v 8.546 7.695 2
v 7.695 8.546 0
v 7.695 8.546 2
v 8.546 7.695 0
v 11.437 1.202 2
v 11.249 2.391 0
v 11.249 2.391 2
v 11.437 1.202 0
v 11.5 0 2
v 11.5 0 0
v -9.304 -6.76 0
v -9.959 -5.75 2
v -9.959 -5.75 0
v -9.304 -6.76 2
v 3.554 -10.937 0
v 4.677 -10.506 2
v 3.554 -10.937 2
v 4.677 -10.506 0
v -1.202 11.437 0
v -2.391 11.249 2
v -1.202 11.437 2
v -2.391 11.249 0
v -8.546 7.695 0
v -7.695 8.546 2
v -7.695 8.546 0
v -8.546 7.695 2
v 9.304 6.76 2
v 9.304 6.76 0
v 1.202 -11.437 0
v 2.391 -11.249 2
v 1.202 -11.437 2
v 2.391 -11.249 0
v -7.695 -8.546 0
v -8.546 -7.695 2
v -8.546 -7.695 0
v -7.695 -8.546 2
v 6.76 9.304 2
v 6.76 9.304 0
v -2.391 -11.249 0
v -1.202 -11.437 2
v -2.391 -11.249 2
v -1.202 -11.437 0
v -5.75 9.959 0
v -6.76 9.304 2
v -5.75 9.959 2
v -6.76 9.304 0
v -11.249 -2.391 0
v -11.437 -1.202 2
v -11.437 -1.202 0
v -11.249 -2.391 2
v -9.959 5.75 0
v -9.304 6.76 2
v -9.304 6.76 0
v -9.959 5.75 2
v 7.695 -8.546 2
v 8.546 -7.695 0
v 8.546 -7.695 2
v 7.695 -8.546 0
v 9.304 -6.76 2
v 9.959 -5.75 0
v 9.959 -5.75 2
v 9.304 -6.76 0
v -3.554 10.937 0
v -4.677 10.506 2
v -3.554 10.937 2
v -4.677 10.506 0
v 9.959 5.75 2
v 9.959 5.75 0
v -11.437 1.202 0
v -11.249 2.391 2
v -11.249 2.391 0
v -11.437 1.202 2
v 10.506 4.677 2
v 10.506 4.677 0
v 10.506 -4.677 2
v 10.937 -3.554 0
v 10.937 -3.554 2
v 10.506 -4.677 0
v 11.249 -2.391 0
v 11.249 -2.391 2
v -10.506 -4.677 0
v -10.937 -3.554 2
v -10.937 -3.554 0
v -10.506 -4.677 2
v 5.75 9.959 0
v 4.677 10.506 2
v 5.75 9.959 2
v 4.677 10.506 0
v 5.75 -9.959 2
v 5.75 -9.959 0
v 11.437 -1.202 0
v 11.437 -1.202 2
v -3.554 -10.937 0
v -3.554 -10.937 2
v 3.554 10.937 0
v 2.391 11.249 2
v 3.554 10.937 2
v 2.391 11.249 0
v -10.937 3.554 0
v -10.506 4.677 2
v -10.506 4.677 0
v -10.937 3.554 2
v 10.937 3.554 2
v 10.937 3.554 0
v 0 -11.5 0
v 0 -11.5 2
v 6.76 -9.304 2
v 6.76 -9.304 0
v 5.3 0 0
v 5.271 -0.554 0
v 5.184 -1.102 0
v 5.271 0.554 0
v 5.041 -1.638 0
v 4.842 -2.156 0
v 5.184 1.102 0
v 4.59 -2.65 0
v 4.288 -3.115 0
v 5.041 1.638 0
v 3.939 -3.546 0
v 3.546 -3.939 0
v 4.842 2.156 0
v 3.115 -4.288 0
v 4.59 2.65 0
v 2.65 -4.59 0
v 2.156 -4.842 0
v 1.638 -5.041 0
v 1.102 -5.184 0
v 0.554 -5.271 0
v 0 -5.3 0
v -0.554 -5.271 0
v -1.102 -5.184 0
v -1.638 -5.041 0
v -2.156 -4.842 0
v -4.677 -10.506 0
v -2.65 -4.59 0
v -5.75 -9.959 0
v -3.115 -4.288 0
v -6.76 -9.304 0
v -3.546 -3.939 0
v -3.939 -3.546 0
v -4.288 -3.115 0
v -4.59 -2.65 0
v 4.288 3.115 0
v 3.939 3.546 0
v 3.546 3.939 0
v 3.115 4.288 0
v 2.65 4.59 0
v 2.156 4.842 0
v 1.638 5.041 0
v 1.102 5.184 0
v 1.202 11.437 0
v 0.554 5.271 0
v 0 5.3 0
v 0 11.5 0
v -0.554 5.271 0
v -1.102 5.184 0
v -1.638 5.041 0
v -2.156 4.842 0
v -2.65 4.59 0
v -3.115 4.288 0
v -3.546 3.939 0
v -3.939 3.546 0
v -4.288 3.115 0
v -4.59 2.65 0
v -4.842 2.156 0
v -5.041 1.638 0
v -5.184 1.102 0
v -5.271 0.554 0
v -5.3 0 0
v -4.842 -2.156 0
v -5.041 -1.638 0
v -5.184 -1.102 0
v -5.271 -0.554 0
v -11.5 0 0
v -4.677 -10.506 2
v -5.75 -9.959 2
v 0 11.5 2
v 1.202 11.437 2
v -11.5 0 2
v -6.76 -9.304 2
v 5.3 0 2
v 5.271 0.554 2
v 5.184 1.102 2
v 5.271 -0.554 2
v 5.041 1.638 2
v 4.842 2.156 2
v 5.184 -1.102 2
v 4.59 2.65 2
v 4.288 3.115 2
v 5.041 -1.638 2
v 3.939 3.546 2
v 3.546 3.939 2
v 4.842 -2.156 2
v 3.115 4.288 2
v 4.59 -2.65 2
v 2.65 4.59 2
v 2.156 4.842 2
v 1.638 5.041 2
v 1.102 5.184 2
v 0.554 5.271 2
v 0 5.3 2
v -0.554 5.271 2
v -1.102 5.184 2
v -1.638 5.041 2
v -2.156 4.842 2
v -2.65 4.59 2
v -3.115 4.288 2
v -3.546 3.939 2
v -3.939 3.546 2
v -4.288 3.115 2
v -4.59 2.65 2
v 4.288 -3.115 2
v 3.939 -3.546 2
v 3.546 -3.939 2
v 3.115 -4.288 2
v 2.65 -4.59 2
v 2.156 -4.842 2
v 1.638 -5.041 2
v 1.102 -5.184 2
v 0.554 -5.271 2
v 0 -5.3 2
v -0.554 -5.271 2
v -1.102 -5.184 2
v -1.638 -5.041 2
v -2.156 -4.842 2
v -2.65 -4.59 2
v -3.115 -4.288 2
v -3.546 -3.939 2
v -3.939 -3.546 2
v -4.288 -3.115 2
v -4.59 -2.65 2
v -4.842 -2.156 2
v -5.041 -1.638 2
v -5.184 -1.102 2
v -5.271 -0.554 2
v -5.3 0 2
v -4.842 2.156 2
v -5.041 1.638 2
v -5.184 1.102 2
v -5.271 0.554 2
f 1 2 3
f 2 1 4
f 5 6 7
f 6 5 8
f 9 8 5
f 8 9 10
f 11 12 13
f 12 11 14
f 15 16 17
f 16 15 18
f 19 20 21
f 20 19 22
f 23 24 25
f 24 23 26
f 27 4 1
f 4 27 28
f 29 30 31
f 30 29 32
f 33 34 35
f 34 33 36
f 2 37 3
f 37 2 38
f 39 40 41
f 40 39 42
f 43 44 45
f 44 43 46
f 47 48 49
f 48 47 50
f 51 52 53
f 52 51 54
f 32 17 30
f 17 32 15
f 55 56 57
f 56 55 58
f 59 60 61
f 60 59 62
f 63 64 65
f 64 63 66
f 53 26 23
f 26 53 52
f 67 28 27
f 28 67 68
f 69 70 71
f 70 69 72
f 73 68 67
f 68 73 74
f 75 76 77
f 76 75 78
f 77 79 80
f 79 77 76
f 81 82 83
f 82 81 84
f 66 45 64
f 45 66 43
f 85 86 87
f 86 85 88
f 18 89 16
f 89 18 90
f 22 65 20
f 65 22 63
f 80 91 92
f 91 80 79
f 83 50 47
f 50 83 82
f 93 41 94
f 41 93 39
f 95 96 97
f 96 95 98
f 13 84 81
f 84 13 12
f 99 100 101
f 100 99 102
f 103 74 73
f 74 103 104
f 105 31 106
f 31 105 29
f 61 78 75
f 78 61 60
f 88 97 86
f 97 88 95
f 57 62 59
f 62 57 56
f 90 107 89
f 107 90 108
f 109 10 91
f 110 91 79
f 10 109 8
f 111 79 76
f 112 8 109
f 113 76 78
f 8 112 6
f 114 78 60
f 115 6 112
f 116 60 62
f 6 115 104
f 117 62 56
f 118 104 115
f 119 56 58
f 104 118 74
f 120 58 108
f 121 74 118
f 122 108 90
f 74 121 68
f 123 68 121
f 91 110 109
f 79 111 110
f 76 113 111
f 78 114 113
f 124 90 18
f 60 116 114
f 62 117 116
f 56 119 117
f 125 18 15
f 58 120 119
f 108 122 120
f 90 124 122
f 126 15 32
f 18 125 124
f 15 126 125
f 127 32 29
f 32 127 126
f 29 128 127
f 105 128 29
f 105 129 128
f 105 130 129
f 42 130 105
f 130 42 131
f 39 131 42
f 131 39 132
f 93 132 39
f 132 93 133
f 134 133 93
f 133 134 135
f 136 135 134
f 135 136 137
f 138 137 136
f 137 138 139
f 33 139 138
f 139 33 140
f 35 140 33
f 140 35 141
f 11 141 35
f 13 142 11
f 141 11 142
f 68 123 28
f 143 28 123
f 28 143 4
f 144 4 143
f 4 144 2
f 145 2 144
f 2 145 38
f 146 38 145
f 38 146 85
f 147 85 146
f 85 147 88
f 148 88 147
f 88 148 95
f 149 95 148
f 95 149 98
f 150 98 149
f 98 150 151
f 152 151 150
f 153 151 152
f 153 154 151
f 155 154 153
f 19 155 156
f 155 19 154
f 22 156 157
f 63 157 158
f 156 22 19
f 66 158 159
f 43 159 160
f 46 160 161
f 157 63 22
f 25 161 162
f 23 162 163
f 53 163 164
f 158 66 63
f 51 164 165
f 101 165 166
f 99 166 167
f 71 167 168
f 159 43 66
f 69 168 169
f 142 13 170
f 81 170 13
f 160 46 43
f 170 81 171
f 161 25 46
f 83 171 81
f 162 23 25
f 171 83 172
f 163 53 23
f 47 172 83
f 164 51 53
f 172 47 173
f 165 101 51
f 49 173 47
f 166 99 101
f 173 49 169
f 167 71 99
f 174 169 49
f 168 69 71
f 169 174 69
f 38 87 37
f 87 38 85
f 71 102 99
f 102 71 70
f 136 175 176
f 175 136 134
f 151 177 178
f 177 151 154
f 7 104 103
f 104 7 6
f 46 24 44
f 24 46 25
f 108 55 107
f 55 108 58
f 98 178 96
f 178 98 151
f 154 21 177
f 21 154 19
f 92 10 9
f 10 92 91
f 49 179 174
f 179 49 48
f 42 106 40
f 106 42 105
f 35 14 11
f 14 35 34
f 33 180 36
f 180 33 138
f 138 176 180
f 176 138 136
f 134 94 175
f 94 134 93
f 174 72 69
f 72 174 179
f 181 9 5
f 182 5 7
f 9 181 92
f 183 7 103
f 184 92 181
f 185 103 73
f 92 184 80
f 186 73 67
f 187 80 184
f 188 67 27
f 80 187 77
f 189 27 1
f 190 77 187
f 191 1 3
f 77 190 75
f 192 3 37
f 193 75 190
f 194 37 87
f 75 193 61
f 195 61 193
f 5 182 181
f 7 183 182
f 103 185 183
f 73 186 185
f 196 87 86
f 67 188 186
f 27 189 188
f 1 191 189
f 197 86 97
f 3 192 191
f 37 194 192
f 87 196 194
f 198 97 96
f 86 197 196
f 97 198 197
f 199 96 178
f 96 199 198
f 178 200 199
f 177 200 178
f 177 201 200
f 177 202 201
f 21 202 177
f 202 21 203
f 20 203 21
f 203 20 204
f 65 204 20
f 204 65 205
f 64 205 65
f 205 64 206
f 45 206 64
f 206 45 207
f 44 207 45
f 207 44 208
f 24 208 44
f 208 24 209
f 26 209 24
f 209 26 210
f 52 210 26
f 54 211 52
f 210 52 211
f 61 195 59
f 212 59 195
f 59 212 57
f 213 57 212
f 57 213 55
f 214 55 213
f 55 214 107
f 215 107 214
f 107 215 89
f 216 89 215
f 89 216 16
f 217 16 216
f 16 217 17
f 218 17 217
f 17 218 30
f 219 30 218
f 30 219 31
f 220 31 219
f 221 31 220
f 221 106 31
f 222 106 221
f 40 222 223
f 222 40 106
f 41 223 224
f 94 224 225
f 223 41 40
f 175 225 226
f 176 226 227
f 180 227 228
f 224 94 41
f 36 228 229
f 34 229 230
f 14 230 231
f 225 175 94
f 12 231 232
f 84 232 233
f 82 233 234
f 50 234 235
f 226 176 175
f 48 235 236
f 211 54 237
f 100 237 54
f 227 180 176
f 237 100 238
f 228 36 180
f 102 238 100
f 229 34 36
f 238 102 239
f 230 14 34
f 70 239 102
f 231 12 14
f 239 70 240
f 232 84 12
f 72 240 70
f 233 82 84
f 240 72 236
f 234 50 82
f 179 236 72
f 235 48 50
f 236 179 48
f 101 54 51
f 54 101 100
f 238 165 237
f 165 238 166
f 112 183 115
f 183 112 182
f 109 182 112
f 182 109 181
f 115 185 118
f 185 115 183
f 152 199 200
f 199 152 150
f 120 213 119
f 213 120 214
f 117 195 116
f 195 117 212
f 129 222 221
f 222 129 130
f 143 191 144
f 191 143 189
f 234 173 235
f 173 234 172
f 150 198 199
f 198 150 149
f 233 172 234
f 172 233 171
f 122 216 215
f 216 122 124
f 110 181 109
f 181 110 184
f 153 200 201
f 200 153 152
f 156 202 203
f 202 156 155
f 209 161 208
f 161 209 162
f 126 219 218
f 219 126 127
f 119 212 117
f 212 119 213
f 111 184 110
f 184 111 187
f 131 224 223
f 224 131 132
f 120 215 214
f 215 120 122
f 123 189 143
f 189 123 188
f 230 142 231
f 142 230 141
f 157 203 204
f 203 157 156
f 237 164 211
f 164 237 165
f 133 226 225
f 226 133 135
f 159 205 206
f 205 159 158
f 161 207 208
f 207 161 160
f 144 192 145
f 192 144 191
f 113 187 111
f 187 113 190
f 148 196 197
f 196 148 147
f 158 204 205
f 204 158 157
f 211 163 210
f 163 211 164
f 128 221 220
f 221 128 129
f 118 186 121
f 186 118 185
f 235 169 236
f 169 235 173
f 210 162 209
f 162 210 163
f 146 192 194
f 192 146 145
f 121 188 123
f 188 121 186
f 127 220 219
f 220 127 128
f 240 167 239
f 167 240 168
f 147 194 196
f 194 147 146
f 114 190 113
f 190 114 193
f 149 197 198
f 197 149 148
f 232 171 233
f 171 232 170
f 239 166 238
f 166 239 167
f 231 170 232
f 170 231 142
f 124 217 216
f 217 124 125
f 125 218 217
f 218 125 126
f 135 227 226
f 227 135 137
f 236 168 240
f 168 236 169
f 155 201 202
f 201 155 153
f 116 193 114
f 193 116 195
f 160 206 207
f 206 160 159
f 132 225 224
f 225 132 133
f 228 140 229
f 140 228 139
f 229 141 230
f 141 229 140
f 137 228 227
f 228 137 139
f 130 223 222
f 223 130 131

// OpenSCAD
d1=23;
d2=10.6;
h=2;
$fn = 60;
difference() {
    cylinder(h=h, d=d1);
    cylinder(h=h, d=d2);
}
